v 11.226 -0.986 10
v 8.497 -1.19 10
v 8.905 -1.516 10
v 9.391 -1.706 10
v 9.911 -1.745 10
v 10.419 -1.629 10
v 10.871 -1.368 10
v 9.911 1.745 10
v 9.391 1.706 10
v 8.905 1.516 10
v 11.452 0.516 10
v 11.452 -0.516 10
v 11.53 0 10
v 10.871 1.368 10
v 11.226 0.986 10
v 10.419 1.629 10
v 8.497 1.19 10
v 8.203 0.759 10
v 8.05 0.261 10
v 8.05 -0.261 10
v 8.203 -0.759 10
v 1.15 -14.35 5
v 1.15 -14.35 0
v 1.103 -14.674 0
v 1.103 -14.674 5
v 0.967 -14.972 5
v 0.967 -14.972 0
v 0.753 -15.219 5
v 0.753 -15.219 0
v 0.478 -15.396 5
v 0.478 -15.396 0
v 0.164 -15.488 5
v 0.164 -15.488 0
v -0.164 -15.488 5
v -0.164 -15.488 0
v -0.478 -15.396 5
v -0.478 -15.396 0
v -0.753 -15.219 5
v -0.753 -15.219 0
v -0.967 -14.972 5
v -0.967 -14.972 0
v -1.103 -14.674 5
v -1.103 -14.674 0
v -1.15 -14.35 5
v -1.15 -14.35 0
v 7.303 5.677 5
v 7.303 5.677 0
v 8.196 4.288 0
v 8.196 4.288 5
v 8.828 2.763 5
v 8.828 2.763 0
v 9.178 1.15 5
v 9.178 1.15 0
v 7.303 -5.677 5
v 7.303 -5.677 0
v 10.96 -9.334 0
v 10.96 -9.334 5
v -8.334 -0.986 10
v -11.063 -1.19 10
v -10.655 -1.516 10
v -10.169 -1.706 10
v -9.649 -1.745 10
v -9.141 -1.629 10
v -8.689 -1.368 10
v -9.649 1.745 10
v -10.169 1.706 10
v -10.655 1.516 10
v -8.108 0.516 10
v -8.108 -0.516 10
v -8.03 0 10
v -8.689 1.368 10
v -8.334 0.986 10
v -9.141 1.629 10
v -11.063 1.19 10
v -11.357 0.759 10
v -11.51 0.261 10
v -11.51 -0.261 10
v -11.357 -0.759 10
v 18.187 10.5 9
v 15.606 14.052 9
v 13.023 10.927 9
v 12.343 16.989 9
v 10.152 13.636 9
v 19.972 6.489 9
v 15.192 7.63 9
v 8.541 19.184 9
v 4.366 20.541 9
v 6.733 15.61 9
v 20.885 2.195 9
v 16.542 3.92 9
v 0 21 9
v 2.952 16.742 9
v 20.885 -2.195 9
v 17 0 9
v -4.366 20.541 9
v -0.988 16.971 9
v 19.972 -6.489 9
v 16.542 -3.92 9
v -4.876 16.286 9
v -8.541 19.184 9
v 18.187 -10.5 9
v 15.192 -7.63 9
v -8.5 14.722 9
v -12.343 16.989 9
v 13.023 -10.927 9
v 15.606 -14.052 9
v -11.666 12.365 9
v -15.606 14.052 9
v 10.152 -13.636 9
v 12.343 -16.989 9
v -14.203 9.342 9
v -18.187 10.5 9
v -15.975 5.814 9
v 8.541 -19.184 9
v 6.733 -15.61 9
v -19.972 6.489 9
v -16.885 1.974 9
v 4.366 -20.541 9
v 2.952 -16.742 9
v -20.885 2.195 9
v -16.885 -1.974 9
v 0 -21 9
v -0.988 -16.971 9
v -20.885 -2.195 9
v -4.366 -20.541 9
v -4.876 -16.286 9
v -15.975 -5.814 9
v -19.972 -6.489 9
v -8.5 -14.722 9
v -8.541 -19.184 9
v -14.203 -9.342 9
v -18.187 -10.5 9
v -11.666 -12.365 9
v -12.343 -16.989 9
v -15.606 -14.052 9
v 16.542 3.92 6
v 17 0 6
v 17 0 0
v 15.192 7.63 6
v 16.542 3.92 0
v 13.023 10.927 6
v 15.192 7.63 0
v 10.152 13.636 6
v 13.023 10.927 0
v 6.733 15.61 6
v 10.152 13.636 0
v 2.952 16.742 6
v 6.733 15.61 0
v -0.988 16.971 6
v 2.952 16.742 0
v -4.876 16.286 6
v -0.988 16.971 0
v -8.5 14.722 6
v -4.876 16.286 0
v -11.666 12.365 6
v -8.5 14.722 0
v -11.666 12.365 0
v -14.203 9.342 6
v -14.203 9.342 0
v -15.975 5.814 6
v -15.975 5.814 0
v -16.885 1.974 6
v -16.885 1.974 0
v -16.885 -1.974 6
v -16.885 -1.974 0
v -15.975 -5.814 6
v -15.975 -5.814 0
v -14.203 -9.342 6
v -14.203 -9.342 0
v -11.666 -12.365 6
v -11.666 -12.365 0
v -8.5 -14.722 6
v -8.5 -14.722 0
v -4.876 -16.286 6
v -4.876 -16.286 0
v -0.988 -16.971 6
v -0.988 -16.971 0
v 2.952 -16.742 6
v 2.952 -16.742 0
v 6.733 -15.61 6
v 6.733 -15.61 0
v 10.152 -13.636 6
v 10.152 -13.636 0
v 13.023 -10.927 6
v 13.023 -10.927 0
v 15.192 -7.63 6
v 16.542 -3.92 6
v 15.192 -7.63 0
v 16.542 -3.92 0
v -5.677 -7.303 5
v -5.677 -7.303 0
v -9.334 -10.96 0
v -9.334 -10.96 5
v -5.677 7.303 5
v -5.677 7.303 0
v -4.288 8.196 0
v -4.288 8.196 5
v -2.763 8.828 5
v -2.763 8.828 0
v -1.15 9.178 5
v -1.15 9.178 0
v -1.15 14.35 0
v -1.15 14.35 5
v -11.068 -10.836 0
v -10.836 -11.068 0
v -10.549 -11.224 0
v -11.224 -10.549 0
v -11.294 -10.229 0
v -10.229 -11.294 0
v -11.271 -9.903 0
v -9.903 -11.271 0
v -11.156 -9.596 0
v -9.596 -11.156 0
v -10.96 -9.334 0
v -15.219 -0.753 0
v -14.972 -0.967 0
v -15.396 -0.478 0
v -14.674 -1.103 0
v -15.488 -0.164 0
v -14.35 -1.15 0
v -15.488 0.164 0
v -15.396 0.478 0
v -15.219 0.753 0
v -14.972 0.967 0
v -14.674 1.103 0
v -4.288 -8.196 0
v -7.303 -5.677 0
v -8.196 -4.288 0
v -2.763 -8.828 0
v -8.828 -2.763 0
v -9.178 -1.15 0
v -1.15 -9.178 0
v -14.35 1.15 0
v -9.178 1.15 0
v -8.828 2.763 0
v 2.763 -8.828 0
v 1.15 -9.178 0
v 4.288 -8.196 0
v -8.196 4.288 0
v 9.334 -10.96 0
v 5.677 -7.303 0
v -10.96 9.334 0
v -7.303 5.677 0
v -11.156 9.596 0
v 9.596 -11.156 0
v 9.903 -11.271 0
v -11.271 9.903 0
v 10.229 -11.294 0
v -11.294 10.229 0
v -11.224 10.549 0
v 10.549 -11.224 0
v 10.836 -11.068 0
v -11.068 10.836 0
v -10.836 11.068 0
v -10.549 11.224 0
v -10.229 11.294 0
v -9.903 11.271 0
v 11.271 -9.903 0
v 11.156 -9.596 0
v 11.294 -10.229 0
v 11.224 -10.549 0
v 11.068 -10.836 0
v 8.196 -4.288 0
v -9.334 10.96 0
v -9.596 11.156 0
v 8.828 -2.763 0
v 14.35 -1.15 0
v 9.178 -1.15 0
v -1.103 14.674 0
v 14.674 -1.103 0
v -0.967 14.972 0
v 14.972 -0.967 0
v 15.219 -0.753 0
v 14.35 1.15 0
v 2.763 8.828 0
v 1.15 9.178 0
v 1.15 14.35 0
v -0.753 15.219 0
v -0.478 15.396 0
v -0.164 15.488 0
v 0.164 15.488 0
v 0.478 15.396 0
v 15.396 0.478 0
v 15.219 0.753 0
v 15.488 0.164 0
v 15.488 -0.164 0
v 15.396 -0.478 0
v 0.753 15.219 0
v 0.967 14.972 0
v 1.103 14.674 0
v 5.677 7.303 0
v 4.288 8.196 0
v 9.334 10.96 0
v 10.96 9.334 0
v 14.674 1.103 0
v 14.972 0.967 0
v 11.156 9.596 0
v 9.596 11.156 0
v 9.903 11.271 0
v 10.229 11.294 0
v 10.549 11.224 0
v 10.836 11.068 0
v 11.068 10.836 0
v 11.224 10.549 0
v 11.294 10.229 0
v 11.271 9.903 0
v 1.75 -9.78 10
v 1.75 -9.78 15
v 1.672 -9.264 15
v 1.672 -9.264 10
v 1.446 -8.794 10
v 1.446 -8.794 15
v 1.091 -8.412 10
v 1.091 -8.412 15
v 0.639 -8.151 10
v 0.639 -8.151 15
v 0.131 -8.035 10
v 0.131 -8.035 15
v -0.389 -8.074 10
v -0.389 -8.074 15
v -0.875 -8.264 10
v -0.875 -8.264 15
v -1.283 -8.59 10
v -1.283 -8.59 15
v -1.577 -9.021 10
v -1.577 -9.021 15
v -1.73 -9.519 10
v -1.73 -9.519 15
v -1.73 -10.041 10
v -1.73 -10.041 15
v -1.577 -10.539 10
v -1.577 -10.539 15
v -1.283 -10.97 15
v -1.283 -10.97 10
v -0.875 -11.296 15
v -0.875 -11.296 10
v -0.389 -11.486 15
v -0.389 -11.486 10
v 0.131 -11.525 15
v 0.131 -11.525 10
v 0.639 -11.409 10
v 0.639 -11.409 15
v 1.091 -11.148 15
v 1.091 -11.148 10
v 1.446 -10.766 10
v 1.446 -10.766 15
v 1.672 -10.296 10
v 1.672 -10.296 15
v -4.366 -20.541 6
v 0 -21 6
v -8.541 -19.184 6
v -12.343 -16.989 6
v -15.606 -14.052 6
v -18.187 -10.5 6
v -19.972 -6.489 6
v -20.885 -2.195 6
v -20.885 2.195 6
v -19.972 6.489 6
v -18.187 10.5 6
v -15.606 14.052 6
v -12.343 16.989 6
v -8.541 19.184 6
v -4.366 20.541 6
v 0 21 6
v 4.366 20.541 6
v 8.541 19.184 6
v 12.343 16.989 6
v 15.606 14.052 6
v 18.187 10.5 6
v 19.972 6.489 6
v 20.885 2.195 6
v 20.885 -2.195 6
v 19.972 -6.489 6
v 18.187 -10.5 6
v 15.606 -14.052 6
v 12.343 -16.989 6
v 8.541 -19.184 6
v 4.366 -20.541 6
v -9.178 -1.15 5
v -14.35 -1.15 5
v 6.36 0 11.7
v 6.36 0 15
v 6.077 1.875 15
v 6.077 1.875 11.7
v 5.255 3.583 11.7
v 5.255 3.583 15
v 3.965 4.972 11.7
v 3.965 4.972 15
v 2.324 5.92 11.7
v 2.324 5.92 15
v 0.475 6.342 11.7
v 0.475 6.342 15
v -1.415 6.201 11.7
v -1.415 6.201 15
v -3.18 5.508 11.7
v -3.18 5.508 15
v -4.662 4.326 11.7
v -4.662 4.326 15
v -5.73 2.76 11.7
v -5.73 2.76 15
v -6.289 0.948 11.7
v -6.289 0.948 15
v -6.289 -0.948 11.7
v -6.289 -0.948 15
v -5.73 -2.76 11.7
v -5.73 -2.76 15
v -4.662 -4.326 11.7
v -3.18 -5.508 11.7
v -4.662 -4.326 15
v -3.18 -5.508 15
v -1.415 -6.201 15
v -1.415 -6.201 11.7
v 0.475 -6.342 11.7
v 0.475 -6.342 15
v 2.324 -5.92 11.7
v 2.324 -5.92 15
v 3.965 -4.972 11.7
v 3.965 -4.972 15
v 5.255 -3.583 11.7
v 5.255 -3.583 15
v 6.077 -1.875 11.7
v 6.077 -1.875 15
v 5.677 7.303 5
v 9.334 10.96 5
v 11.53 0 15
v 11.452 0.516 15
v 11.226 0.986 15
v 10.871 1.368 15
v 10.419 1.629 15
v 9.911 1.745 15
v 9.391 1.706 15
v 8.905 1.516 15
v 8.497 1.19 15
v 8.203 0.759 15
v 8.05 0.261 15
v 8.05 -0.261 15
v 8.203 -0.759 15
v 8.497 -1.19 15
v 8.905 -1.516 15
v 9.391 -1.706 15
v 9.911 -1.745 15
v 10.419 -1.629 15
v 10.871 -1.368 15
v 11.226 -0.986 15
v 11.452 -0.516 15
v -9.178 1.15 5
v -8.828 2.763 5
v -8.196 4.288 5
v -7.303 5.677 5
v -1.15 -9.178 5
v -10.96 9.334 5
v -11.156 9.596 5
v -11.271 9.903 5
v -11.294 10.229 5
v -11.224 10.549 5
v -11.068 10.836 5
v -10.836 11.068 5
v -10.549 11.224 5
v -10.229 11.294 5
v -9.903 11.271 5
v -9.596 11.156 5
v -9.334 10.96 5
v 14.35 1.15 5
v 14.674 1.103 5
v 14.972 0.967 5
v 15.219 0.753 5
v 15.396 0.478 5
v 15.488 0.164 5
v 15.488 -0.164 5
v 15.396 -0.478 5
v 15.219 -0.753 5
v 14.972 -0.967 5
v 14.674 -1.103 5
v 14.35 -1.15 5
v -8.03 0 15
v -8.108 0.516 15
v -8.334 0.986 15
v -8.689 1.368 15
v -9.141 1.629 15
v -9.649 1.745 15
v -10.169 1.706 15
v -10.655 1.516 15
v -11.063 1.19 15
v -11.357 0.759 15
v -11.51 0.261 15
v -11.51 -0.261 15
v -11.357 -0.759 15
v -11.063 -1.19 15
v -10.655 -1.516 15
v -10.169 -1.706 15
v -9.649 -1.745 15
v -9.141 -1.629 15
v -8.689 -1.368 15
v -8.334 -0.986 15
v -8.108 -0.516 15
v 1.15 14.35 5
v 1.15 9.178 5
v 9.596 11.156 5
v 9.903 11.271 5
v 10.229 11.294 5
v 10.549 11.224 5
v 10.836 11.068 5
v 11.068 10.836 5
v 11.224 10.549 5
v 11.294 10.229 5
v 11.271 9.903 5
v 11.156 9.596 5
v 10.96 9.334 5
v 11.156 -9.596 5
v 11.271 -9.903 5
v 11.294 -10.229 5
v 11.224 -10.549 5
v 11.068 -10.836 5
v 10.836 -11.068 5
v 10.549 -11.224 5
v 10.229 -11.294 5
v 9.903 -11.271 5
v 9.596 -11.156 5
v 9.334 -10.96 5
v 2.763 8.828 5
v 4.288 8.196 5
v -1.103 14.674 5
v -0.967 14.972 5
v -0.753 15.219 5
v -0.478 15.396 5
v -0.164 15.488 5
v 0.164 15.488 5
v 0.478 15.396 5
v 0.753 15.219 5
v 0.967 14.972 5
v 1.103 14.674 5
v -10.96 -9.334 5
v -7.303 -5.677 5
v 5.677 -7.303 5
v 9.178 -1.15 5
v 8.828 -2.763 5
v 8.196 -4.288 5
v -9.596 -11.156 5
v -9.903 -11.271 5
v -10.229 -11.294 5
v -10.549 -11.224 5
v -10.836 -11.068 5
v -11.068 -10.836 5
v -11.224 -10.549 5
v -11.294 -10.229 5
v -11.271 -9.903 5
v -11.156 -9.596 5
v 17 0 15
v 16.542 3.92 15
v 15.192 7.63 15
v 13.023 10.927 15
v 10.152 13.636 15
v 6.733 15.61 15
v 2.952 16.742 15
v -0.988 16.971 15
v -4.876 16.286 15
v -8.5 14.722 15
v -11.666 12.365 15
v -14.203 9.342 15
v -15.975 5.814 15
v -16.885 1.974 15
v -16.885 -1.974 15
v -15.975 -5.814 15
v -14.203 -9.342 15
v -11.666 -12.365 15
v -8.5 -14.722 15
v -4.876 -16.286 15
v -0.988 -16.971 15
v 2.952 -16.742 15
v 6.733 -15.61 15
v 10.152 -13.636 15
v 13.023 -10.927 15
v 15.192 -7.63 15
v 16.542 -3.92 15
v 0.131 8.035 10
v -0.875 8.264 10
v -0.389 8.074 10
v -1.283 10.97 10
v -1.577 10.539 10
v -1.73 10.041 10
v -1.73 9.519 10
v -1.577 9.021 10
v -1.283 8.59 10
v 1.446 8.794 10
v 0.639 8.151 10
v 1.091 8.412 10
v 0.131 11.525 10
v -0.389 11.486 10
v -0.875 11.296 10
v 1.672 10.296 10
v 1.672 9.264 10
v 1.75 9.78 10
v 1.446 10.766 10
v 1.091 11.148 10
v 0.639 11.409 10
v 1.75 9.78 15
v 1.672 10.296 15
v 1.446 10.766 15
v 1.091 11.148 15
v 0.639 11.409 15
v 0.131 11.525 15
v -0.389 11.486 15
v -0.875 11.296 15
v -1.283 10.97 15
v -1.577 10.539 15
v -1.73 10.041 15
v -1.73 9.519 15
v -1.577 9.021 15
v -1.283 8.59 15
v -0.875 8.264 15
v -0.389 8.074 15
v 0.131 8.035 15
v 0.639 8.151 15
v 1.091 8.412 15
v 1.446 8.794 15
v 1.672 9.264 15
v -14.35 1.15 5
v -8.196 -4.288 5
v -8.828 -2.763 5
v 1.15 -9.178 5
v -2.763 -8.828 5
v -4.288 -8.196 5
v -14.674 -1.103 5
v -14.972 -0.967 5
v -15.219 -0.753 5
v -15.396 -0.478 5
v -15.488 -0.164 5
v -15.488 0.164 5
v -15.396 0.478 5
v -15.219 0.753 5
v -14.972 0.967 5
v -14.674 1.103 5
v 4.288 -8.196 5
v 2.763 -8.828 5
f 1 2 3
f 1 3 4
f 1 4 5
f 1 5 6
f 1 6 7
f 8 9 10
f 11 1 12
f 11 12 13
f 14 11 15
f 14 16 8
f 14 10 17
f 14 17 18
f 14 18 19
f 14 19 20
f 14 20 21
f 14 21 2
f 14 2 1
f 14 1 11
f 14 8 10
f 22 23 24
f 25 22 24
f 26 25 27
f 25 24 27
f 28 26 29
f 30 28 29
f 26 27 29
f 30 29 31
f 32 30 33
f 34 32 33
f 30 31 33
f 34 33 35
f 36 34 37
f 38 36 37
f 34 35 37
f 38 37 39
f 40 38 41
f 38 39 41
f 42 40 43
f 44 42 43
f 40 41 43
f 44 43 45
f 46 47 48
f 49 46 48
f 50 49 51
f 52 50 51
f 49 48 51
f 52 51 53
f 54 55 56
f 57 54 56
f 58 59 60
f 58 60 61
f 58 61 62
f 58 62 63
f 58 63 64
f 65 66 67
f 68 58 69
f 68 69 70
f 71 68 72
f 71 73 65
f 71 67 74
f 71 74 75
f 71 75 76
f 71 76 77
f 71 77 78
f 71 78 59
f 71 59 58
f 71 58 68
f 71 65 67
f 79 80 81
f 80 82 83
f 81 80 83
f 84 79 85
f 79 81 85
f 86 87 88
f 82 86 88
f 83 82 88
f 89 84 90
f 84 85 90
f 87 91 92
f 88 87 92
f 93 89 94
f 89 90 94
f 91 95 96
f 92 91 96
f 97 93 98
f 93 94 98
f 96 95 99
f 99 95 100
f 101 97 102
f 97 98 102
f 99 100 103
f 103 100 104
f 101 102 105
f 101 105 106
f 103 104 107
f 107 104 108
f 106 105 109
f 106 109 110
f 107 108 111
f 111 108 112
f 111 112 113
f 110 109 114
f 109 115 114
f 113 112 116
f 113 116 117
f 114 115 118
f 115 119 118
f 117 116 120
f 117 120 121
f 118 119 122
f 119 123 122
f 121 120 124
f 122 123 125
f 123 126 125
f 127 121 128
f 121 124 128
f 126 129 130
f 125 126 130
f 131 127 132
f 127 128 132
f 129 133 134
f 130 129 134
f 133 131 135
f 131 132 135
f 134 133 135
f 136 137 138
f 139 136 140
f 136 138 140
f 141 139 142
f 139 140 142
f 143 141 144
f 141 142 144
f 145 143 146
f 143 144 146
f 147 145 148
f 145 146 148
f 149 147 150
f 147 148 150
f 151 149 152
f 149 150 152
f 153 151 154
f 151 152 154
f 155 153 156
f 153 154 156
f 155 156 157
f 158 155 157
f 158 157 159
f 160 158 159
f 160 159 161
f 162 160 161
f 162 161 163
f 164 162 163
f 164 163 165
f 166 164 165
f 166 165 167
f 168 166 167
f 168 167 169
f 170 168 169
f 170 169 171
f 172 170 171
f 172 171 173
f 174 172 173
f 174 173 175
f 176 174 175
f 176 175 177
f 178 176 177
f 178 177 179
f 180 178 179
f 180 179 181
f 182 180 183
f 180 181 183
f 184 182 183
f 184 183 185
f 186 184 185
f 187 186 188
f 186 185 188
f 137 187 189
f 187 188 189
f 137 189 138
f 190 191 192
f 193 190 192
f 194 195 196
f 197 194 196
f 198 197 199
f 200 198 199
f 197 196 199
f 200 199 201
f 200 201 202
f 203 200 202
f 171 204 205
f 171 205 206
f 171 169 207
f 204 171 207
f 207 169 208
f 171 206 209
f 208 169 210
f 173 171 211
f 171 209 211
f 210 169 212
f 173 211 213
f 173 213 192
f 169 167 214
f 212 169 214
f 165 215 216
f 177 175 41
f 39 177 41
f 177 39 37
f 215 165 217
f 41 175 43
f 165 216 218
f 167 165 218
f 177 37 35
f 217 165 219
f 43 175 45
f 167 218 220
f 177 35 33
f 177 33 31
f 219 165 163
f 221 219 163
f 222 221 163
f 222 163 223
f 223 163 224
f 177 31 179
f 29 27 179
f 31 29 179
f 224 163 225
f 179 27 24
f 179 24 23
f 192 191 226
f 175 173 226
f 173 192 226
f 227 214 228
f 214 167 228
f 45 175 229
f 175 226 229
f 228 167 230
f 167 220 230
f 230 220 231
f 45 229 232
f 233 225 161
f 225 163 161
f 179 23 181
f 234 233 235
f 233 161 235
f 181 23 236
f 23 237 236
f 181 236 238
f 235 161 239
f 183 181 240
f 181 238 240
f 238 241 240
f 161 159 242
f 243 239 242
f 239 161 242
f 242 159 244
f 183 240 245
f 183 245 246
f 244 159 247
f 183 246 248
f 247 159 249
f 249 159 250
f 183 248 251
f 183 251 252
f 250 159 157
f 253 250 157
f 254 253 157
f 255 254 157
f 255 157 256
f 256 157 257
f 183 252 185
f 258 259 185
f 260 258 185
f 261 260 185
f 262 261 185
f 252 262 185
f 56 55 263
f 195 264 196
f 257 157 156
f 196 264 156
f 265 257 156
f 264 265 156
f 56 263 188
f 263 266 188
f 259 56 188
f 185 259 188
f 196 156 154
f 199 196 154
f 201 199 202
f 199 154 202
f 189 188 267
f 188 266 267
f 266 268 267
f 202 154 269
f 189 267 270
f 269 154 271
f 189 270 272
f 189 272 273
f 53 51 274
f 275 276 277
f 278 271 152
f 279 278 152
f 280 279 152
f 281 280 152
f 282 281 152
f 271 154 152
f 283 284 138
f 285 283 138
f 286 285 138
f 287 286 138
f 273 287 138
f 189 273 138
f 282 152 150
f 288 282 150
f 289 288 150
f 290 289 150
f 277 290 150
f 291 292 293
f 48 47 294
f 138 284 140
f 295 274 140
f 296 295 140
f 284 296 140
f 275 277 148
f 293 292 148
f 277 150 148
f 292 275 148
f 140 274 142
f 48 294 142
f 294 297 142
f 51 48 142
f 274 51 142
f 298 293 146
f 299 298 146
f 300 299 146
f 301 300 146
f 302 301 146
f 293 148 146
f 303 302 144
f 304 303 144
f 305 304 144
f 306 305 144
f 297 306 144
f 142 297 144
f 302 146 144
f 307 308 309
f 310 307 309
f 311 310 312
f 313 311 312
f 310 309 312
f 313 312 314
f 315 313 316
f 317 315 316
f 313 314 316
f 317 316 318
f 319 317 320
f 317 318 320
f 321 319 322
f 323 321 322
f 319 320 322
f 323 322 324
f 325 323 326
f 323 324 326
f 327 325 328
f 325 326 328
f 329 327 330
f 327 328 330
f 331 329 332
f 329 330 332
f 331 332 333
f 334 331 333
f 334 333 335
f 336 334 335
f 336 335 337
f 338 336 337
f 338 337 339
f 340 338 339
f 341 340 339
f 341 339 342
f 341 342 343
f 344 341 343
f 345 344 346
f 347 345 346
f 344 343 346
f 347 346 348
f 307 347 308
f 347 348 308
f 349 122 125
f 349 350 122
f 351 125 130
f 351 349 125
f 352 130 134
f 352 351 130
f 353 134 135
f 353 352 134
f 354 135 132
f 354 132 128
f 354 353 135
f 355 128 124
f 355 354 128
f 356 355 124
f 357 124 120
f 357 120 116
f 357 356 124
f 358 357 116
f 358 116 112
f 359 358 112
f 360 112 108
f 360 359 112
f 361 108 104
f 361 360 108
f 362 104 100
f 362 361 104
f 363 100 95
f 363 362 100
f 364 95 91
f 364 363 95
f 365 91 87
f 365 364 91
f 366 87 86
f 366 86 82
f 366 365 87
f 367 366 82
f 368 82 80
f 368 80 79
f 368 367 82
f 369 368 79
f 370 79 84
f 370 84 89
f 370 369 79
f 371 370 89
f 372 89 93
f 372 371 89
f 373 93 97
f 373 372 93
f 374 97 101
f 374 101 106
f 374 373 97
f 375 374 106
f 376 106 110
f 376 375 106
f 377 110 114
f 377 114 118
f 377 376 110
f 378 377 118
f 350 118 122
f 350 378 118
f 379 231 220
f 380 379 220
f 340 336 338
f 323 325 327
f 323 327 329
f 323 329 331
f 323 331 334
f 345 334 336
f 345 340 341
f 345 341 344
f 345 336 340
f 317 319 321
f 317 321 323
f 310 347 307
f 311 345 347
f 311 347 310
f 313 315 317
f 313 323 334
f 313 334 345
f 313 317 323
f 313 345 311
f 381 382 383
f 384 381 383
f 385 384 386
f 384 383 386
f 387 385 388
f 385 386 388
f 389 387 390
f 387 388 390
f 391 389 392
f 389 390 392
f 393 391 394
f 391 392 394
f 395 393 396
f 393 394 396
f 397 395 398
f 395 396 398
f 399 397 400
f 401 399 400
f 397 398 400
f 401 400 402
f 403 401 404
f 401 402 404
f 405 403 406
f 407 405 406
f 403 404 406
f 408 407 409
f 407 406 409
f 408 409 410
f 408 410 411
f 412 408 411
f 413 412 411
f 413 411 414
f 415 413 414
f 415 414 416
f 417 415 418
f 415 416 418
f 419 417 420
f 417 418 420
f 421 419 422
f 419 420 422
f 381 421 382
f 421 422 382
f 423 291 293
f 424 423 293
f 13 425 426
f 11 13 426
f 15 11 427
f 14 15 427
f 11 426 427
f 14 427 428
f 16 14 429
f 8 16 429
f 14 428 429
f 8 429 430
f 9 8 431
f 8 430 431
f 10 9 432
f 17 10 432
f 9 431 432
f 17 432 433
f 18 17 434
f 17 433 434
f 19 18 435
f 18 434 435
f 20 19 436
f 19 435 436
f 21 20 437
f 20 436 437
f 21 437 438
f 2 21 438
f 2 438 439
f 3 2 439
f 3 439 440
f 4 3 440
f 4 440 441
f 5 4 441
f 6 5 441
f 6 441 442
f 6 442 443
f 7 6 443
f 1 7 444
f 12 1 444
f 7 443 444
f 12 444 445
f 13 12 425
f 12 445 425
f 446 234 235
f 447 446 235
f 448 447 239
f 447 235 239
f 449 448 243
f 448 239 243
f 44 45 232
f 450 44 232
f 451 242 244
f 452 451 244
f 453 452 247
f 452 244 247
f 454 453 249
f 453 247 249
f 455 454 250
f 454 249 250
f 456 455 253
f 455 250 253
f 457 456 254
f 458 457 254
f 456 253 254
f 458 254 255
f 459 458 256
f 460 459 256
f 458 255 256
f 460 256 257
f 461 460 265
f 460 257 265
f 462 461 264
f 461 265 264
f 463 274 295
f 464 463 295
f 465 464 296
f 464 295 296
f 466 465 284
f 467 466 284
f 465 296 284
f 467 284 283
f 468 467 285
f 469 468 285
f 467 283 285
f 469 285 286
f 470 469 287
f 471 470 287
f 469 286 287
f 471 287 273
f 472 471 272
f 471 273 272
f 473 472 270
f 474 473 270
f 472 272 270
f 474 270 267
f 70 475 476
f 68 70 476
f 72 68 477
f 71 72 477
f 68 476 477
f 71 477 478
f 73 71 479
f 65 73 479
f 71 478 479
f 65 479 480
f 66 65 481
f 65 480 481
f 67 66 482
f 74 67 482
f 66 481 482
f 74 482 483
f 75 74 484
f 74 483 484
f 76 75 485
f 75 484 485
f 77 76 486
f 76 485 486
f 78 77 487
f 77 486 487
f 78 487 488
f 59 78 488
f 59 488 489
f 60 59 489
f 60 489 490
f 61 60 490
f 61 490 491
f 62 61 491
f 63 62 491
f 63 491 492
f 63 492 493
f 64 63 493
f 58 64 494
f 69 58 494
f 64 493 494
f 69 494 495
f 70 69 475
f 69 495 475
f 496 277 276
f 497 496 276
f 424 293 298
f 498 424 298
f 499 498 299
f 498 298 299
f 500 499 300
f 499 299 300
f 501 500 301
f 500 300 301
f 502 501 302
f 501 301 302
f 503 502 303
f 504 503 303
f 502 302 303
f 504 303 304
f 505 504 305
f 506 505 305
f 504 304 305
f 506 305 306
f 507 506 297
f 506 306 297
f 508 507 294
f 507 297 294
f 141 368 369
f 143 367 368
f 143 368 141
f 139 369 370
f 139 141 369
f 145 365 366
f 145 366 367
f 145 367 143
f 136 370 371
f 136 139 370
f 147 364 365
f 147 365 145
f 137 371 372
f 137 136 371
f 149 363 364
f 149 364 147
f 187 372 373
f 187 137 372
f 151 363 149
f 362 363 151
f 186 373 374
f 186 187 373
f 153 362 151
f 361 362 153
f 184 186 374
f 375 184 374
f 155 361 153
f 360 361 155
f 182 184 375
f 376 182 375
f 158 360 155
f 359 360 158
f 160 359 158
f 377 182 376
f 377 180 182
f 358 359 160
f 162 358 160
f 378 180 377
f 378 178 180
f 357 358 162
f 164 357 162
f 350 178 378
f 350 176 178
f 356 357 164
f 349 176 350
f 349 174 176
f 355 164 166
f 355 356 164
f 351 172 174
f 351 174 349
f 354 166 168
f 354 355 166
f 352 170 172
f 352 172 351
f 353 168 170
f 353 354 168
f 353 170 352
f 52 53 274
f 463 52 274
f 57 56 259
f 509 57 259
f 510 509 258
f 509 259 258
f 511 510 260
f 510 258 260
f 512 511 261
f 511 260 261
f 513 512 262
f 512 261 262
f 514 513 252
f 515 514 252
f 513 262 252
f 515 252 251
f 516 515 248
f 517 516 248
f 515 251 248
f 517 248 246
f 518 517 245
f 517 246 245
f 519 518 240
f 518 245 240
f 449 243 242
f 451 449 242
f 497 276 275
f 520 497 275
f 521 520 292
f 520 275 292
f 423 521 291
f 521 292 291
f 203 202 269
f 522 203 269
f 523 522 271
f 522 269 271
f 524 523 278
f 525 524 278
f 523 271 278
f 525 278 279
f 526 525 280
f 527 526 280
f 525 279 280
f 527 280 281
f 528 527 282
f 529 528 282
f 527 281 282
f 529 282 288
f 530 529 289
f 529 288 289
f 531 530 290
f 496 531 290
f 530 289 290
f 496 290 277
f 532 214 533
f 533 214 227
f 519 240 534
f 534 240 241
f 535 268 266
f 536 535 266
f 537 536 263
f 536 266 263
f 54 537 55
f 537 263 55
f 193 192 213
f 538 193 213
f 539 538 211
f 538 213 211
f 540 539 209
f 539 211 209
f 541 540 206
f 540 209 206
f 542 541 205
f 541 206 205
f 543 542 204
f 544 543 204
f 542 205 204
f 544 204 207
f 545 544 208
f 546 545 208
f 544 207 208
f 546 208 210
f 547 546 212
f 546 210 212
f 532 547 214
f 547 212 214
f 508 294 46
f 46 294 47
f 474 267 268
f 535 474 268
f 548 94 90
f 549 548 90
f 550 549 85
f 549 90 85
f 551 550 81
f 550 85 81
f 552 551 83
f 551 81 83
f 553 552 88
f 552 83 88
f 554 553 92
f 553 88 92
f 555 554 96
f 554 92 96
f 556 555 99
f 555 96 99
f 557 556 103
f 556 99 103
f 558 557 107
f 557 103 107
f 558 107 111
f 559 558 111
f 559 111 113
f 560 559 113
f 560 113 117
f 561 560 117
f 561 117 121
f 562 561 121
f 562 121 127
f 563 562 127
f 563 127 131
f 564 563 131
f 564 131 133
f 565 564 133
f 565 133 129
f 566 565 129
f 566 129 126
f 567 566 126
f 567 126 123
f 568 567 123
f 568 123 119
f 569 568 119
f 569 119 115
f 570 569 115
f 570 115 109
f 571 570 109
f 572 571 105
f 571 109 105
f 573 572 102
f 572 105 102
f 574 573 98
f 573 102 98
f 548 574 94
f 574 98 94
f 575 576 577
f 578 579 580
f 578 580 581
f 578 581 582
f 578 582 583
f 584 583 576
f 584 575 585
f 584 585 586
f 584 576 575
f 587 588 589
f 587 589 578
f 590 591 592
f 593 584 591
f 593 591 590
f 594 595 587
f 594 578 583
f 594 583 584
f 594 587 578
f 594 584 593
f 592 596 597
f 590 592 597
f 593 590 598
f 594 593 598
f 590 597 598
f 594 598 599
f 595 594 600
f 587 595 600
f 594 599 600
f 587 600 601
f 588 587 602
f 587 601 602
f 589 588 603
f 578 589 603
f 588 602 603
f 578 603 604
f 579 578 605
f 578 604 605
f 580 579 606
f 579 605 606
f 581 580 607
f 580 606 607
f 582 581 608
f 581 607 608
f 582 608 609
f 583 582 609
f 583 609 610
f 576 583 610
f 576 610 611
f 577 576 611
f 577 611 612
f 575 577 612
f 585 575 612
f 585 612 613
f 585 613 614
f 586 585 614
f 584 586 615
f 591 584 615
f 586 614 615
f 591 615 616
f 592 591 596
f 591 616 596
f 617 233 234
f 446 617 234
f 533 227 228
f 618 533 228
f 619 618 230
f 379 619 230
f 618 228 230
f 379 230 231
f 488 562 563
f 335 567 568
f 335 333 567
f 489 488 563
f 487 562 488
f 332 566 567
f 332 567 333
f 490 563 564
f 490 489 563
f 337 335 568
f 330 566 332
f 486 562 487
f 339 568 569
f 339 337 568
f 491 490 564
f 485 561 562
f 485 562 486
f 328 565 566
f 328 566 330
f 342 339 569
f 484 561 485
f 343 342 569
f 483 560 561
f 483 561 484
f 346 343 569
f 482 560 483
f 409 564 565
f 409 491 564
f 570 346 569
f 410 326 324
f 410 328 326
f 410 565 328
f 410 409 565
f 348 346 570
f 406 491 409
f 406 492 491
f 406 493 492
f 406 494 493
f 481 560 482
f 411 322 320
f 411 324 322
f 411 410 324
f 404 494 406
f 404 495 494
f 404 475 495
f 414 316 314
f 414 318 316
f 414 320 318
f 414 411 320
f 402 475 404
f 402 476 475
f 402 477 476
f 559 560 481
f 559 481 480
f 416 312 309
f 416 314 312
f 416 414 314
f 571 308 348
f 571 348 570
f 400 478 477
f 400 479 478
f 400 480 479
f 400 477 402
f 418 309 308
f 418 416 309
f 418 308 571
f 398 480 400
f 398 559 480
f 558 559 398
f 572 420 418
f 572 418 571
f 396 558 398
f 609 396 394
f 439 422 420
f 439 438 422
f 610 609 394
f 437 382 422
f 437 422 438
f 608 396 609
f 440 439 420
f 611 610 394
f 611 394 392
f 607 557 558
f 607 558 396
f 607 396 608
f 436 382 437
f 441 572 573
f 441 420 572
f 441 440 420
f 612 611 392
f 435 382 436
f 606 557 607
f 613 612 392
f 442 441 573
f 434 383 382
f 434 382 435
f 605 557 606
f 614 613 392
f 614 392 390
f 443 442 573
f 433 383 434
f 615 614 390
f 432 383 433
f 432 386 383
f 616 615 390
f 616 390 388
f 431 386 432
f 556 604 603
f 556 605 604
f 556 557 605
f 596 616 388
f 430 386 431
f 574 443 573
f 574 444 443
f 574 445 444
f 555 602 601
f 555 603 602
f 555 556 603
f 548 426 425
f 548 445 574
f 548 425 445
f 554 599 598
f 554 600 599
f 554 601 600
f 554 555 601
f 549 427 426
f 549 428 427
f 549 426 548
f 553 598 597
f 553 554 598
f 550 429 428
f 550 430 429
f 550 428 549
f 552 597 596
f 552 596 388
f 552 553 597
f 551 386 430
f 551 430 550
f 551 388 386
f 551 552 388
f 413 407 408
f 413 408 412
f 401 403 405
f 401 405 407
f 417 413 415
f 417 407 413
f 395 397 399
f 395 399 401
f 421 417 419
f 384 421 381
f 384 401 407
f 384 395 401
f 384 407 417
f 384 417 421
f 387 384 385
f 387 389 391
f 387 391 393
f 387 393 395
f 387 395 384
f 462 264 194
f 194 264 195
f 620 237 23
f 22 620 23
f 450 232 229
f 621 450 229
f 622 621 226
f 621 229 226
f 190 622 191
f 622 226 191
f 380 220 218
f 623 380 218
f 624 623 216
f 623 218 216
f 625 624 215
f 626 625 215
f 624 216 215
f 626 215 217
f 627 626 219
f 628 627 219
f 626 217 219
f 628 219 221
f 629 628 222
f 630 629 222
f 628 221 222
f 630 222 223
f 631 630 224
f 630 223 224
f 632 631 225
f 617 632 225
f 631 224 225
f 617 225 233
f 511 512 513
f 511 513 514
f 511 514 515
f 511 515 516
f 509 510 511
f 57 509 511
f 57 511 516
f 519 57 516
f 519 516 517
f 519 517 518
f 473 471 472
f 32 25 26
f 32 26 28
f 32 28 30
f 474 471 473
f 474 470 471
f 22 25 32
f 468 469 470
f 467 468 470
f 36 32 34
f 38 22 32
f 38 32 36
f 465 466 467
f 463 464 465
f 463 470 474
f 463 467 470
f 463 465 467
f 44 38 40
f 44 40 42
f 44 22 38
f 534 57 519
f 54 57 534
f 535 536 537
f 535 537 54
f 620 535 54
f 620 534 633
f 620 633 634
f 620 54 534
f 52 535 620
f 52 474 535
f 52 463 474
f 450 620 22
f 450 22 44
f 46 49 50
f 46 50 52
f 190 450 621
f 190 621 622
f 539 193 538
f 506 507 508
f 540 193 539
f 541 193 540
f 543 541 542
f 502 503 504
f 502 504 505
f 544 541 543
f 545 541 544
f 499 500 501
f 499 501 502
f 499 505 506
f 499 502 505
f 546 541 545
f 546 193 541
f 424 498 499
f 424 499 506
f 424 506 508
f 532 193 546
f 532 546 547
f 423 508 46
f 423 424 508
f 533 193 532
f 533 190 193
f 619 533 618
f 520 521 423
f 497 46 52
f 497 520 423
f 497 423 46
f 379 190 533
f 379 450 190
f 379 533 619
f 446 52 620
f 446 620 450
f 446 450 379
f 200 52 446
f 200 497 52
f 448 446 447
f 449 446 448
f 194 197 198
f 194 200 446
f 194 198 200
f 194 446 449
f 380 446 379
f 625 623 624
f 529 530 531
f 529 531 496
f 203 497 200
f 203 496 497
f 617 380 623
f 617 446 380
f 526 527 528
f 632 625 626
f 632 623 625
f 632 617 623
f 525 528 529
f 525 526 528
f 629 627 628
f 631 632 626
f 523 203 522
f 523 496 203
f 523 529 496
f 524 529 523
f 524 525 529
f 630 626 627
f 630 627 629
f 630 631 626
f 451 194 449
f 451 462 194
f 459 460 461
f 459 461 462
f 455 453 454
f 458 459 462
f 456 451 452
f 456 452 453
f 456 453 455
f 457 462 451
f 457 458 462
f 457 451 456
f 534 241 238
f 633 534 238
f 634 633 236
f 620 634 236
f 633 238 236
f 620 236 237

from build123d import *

# Parameters (mm, degrees)
SKETCH1_R           = 17
BOSS_EXTRUDE1_DEPTH = 15
CUT_EXTRUDE2_DEPTH  = 5
SKETCH3_R           = 1.75
CUT_EXTRUDE3_DEPTH  = 5
SKETCH4_W           = 3
SKETCH4_H           = 4
SKETCH5_R           = 6.36
CUT_EXTRUDE4_DEPTH  = 3.3


with BuildPart() as part:
    # Sketch1 → Boss-Extrude1 (new body)
    with BuildSketch(Plane.XY):
        Circle(SKETCH1_R)
    extrude(amount=BOSS_EXTRUDE1_DEPTH)

    # Sketch2 → Cut-Extrude2 (cut)
    with BuildSketch(Plane(origin=(0, 0, 0), x_dir=(-1, 0, 0), z_dir=(0, 0, -1))):
        with BuildLine():
            ThreePointArc((5.676819497, 7.303165094), (3.539821749, 8.545885676), (1.15, 9.178235124))
            ThreePointArc((1.15, 9.178235124), (0, 8.028235124), (-1.15, 9.178235124))
            ThreePointArc((-1.15, 9.178235124), (-3.539821749, 8.545885676), (-5.676819497, 7.303165094))
            ThreePointArc((-5.676819497, 7.303165094), (-5.676819497, 5.676819497), (-7.303165094, 5.676819497))
            ThreePointArc((-7.303165094, 5.676819497), (-8.545885676, 3.539821749), (-9.178235124, 1.15))
            ThreePointArc((-9.178235124, 1.15), (-8.028235124, 0), (-9.178235124, -1.15))
            ThreePointArc((-9.178235124, -1.15), (-8.545885676, -3.539821749), (-7.303165094, -5.676819497))
            ThreePointArc((-7.303165094, -5.676819497), (-5.676819497, -5.676819497), (-5.676819497, -7.303165094))
            ThreePointArc((-5.676819497, -7.303165094), (-3.539821749, -8.545885676), (-1.15, -9.178235124))
            ThreePointArc((-1.15, -9.178235124), (0, -8.028235124), (1.15, -9.178235124))
            ThreePointArc((1.15, -9.178235124), (3.539821749, -8.545885676), (5.676819497, -7.303165094))
            ThreePointArc((5.676819497, -7.303165094), (5.676819497, -5.676819497), (7.303165094, -5.676819497))
            ThreePointArc((7.303165094, -5.676819497), (8.545885676, -3.539821749), (9.178235124, -1.15))
            ThreePointArc((9.178235124, -1.15), (8.028235124, 0), (9.178235124, 1.15))
            ThreePointArc((9.178235124, 1.15), (8.545885676, 3.539821749), (7.303165094, 5.676819497))
            ThreePointArc((7.303165094, 5.676819497), (5.676819497, 5.676819497), (5.676819497, 7.303165094))
        make_face()
        with BuildLine():
            Line((9.333809512, 10.960155108), (5.676819497, 7.303165094))
            ThreePointArc((5.676819497, 7.303165094), (6.540737726, 6.540737726), (7.303165094, 5.676819497))
            Line((7.303165094, 5.676819497), (10.960155108, 9.333809512))
            ThreePointArc((10.960155108, 9.333809512), (10.960155108, 10.960155108), (9.333809512, 10.960155108))
        make_face()
        with BuildLine():
            Line((14.35, 1.15), (9.178235124, 1.15))
            ThreePointArc((9.178235124, 1.15), (9.232041348, 0.57611852), (9.25, 0))
            ThreePointArc((9.25, 0), (9.232041348, -0.57611852), (9.178235124, -1.15))
            Line((9.178235124, -1.15), (14.35, -1.15))
            ThreePointArc((14.35, -1.15), (15.5, 0), (14.35, 1.15))
        make_face()
        with BuildLine():
            Line((10.960155108, -9.333809512), (7.303165094, -5.676819497))
            ThreePointArc((7.303165094, -5.676819497), (6.540737726, -6.540737726), (5.676819497, -7.303165094))
            Line((5.676819497, -7.303165094), (9.333809512, -10.960155108))
            ThreePointArc((9.333809512, -10.960155108), (10.960155108, -10.960155108), (10.960155108, -9.333809512))
        make_face()
        with BuildLine():
            Line((1.15, -14.35), (1.15, -9.178235124))
            ThreePointArc((1.15, -9.178235124), (0, -9.25), (-1.15, -9.178235124))
            Line((-1.15, -9.178235124), (-1.15, -14.35))
            ThreePointArc((-1.15, -14.35), (0, -15.5), (1.15, -14.35))
        make_face()
        with BuildLine():
            ThreePointArc((-5.676819497, -7.303165094), (-6.540737726, -6.540737726), (-7.303165094, -5.676819497))
            Line((-7.303165094, -5.676819497), (-10.960155108, -9.333809512))
            ThreePointArc((-10.960155108, -9.333809512), (-10.960155108, -10.960155108), (-9.333809512, -10.960155108))
            Line((-9.333809512, -10.960155108), (-5.676819497, -7.303165094))
        make_face()
        with BuildLine():
            ThreePointArc((-9.178235124, -1.15), (-9.25, 0), (-9.178235124, 1.15))
            Line((-9.178235124, 1.15), (-14.35, 1.15))
            ThreePointArc((-14.35, 1.15), (-15.5, 0), (-14.35, -1.15))
            Line((-14.35, -1.15), (-9.178235124, -1.15))
        make_face()
        with BuildLine():
            ThreePointArc((-7.303165094, 5.676819497), (-6.540737726, 6.540737726), (-5.676819497, 7.303165094))
            Line((-5.676819497, 7.303165094), (-9.333809512, 10.960155108))
            ThreePointArc((-9.333809512, 10.960155108), (-10.960155108, 10.960155108), (-10.960155108, 9.333809512))
            Line((-10.960155108, 9.333809512), (-7.303165094, 5.676819497))
        make_face()
        with BuildLine():
            Line((1.15, 9.178235124), (1.15, 14.35))
            ThreePointArc((1.15, 14.35), (0, 15.5), (-1.15, 14.35))
            Line((-1.15, 14.35), (-1.15, 9.178235124))
            ThreePointArc((-1.15, 9.178235124), (0, 9.25), (1.15, 9.178235124))
        make_face()
        with BuildLine():
            ThreePointArc((5.676819497, -7.303165094), (6.540737726, -6.540737726), (7.303165094, -5.676819497))
            ThreePointArc((7.303165094, -5.676819497), (5.676819497, -5.676819497), (5.676819497, -7.303165094))
        make_face()
        with BuildLine():
            ThreePointArc((-1.15, 9.178235124), (0, 8.028235124), (1.15, 9.178235124))
            ThreePointArc((1.15, 9.178235124), (0, 9.25), (-1.15, 9.178235124))
        make_face()
        with BuildLine():
            ThreePointArc((7.303165094, 5.676819497), (6.540737726, 6.540737726), (5.676819497, 7.303165094))
            ThreePointArc((5.676819497, 7.303165094), (5.676819497, 5.676819497), (7.303165094, 5.676819497))
        make_face()
        with BuildLine():
            ThreePointArc((9.25, 0), (9.232041348, 0.57611852), (9.178235124, 1.15))
            ThreePointArc((9.178235124, 1.15), (8.028235124, 0), (9.178235124, -1.15))
            ThreePointArc((9.178235124, -1.15), (9.232041348, -0.57611852), (9.25, 0))
        make_face()
        with BuildLine():
            ThreePointArc((-1.15, -9.178235124), (0, -9.25), (1.15, -9.178235124))
            ThreePointArc((1.15, -9.178235124), (0, -8.028235124), (-1.15, -9.178235124))
        make_face()
        with BuildLine():
            ThreePointArc((-5.676819497, -7.303165094), (-5.676819497, -5.676819497), (-7.303165094, -5.676819497))
            ThreePointArc((-7.303165094, -5.676819497), (-6.540737726, -6.540737726), (-5.676819497, -7.303165094))
        make_face()
        with BuildLine():
            ThreePointArc((-9.178235124, -1.15), (-8.028235124, 0), (-9.178235124, 1.15))
            ThreePointArc((-9.178235124, 1.15), (-9.25, 0), (-9.178235124, -1.15))
        make_face()
        with BuildLine():
            ThreePointArc((-7.303165094, 5.676819497), (-5.676819497, 5.676819497), (-5.676819497, 7.303165094))
            ThreePointArc((-5.676819497, 7.303165094), (-6.540737726, 6.540737726), (-7.303165094, 5.676819497))
        make_face()
    extrude(amount=-CUT_EXTRUDE2_DEPTH, mode=Mode.SUBTRACT)

    # Sketch3 → Cut-Extrude3 (cut)
    with BuildSketch(Plane.XY.offset(15)):
        with Locations((0, 9.78)):
            Circle(SKETCH3_R)
        with Locations((9.78, 0)):
            Circle(SKETCH3_R)
        with Locations((0, -9.78)):
            Circle(SKETCH3_R)
        with Locations((-9.78, 0)):
            Circle(SKETCH3_R)
    extrude(amount=-CUT_EXTRUDE3_DEPTH, mode=Mode.SUBTRACT)

    # Sketch4 → Revolve1 (revolve)
    with BuildSketch(Plane(origin=(0, 0, 0), x_dir=(0, 0, -1), z_dir=(1, 0, 0))):
        with Locations((-7.5, -19)):
            Rectangle(SKETCH4_W, SKETCH4_H)
    revolve(axis=Axis((0, 0, 20.375620023), (0, 0, -1)))

    # Sketch5 → Cut-Extrude4 (cut)
    with BuildSketch(Plane.XY.offset(15)):
        Circle(SKETCH5_R)
    extrude(amount=-CUT_EXTRUDE4_DEPTH, mode=Mode.SUBTRACT)


solid = part.part
